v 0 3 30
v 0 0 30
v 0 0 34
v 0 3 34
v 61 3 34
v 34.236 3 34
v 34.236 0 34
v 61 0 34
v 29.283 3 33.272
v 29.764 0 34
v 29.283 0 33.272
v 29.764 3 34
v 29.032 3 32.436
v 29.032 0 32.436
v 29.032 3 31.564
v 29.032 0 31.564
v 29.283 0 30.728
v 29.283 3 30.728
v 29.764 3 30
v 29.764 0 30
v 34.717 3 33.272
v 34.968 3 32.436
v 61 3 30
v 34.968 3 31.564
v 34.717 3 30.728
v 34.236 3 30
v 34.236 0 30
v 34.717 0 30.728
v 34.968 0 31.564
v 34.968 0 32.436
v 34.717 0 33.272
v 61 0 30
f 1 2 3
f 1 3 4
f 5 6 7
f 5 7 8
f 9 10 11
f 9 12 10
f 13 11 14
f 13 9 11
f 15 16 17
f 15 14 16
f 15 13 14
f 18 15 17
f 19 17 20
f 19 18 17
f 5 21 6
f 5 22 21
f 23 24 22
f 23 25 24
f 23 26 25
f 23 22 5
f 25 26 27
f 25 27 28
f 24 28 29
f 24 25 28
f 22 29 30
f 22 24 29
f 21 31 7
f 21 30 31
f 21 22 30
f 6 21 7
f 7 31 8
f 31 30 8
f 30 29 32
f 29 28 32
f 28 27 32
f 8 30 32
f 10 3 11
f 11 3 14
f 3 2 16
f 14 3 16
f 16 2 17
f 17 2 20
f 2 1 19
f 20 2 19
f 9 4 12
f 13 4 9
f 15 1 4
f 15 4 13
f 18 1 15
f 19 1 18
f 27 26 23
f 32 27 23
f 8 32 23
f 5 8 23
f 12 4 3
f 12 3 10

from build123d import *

# Parameters (mm, degrees)
CYLINDER869_R     = 3
CYLINDER869_DEPTH = 10
BOX420_W          = 61
BOX420_H          = 3
BOX420_DEPTH      = 4


with BuildPart() as v_lec869:
    # Cylinder869 → Cylinder869 (new body)
    with BuildSketch(Plane(origin=(32, 5, 32), x_dir=(1, 0, 0), z_dir=(0, -1, 0))):
        Circle(CYLINDER869_R)
    extrude(amount=CYLINDER869_DEPTH)


with BuildPart() as cut018:
    # Box420 → Box420 (new body)
    with BuildSketch(Plane.XY.offset(30)):
        with Locations((30.5, 1.5)):
            Rectangle(BOX420_W, BOX420_H)
    extrude(amount=BOX420_DEPTH)

    # Cut018: cut Válec869
    add(v_lec869.part, mode=Mode.SUBTRACT)


solid = cut018.part
